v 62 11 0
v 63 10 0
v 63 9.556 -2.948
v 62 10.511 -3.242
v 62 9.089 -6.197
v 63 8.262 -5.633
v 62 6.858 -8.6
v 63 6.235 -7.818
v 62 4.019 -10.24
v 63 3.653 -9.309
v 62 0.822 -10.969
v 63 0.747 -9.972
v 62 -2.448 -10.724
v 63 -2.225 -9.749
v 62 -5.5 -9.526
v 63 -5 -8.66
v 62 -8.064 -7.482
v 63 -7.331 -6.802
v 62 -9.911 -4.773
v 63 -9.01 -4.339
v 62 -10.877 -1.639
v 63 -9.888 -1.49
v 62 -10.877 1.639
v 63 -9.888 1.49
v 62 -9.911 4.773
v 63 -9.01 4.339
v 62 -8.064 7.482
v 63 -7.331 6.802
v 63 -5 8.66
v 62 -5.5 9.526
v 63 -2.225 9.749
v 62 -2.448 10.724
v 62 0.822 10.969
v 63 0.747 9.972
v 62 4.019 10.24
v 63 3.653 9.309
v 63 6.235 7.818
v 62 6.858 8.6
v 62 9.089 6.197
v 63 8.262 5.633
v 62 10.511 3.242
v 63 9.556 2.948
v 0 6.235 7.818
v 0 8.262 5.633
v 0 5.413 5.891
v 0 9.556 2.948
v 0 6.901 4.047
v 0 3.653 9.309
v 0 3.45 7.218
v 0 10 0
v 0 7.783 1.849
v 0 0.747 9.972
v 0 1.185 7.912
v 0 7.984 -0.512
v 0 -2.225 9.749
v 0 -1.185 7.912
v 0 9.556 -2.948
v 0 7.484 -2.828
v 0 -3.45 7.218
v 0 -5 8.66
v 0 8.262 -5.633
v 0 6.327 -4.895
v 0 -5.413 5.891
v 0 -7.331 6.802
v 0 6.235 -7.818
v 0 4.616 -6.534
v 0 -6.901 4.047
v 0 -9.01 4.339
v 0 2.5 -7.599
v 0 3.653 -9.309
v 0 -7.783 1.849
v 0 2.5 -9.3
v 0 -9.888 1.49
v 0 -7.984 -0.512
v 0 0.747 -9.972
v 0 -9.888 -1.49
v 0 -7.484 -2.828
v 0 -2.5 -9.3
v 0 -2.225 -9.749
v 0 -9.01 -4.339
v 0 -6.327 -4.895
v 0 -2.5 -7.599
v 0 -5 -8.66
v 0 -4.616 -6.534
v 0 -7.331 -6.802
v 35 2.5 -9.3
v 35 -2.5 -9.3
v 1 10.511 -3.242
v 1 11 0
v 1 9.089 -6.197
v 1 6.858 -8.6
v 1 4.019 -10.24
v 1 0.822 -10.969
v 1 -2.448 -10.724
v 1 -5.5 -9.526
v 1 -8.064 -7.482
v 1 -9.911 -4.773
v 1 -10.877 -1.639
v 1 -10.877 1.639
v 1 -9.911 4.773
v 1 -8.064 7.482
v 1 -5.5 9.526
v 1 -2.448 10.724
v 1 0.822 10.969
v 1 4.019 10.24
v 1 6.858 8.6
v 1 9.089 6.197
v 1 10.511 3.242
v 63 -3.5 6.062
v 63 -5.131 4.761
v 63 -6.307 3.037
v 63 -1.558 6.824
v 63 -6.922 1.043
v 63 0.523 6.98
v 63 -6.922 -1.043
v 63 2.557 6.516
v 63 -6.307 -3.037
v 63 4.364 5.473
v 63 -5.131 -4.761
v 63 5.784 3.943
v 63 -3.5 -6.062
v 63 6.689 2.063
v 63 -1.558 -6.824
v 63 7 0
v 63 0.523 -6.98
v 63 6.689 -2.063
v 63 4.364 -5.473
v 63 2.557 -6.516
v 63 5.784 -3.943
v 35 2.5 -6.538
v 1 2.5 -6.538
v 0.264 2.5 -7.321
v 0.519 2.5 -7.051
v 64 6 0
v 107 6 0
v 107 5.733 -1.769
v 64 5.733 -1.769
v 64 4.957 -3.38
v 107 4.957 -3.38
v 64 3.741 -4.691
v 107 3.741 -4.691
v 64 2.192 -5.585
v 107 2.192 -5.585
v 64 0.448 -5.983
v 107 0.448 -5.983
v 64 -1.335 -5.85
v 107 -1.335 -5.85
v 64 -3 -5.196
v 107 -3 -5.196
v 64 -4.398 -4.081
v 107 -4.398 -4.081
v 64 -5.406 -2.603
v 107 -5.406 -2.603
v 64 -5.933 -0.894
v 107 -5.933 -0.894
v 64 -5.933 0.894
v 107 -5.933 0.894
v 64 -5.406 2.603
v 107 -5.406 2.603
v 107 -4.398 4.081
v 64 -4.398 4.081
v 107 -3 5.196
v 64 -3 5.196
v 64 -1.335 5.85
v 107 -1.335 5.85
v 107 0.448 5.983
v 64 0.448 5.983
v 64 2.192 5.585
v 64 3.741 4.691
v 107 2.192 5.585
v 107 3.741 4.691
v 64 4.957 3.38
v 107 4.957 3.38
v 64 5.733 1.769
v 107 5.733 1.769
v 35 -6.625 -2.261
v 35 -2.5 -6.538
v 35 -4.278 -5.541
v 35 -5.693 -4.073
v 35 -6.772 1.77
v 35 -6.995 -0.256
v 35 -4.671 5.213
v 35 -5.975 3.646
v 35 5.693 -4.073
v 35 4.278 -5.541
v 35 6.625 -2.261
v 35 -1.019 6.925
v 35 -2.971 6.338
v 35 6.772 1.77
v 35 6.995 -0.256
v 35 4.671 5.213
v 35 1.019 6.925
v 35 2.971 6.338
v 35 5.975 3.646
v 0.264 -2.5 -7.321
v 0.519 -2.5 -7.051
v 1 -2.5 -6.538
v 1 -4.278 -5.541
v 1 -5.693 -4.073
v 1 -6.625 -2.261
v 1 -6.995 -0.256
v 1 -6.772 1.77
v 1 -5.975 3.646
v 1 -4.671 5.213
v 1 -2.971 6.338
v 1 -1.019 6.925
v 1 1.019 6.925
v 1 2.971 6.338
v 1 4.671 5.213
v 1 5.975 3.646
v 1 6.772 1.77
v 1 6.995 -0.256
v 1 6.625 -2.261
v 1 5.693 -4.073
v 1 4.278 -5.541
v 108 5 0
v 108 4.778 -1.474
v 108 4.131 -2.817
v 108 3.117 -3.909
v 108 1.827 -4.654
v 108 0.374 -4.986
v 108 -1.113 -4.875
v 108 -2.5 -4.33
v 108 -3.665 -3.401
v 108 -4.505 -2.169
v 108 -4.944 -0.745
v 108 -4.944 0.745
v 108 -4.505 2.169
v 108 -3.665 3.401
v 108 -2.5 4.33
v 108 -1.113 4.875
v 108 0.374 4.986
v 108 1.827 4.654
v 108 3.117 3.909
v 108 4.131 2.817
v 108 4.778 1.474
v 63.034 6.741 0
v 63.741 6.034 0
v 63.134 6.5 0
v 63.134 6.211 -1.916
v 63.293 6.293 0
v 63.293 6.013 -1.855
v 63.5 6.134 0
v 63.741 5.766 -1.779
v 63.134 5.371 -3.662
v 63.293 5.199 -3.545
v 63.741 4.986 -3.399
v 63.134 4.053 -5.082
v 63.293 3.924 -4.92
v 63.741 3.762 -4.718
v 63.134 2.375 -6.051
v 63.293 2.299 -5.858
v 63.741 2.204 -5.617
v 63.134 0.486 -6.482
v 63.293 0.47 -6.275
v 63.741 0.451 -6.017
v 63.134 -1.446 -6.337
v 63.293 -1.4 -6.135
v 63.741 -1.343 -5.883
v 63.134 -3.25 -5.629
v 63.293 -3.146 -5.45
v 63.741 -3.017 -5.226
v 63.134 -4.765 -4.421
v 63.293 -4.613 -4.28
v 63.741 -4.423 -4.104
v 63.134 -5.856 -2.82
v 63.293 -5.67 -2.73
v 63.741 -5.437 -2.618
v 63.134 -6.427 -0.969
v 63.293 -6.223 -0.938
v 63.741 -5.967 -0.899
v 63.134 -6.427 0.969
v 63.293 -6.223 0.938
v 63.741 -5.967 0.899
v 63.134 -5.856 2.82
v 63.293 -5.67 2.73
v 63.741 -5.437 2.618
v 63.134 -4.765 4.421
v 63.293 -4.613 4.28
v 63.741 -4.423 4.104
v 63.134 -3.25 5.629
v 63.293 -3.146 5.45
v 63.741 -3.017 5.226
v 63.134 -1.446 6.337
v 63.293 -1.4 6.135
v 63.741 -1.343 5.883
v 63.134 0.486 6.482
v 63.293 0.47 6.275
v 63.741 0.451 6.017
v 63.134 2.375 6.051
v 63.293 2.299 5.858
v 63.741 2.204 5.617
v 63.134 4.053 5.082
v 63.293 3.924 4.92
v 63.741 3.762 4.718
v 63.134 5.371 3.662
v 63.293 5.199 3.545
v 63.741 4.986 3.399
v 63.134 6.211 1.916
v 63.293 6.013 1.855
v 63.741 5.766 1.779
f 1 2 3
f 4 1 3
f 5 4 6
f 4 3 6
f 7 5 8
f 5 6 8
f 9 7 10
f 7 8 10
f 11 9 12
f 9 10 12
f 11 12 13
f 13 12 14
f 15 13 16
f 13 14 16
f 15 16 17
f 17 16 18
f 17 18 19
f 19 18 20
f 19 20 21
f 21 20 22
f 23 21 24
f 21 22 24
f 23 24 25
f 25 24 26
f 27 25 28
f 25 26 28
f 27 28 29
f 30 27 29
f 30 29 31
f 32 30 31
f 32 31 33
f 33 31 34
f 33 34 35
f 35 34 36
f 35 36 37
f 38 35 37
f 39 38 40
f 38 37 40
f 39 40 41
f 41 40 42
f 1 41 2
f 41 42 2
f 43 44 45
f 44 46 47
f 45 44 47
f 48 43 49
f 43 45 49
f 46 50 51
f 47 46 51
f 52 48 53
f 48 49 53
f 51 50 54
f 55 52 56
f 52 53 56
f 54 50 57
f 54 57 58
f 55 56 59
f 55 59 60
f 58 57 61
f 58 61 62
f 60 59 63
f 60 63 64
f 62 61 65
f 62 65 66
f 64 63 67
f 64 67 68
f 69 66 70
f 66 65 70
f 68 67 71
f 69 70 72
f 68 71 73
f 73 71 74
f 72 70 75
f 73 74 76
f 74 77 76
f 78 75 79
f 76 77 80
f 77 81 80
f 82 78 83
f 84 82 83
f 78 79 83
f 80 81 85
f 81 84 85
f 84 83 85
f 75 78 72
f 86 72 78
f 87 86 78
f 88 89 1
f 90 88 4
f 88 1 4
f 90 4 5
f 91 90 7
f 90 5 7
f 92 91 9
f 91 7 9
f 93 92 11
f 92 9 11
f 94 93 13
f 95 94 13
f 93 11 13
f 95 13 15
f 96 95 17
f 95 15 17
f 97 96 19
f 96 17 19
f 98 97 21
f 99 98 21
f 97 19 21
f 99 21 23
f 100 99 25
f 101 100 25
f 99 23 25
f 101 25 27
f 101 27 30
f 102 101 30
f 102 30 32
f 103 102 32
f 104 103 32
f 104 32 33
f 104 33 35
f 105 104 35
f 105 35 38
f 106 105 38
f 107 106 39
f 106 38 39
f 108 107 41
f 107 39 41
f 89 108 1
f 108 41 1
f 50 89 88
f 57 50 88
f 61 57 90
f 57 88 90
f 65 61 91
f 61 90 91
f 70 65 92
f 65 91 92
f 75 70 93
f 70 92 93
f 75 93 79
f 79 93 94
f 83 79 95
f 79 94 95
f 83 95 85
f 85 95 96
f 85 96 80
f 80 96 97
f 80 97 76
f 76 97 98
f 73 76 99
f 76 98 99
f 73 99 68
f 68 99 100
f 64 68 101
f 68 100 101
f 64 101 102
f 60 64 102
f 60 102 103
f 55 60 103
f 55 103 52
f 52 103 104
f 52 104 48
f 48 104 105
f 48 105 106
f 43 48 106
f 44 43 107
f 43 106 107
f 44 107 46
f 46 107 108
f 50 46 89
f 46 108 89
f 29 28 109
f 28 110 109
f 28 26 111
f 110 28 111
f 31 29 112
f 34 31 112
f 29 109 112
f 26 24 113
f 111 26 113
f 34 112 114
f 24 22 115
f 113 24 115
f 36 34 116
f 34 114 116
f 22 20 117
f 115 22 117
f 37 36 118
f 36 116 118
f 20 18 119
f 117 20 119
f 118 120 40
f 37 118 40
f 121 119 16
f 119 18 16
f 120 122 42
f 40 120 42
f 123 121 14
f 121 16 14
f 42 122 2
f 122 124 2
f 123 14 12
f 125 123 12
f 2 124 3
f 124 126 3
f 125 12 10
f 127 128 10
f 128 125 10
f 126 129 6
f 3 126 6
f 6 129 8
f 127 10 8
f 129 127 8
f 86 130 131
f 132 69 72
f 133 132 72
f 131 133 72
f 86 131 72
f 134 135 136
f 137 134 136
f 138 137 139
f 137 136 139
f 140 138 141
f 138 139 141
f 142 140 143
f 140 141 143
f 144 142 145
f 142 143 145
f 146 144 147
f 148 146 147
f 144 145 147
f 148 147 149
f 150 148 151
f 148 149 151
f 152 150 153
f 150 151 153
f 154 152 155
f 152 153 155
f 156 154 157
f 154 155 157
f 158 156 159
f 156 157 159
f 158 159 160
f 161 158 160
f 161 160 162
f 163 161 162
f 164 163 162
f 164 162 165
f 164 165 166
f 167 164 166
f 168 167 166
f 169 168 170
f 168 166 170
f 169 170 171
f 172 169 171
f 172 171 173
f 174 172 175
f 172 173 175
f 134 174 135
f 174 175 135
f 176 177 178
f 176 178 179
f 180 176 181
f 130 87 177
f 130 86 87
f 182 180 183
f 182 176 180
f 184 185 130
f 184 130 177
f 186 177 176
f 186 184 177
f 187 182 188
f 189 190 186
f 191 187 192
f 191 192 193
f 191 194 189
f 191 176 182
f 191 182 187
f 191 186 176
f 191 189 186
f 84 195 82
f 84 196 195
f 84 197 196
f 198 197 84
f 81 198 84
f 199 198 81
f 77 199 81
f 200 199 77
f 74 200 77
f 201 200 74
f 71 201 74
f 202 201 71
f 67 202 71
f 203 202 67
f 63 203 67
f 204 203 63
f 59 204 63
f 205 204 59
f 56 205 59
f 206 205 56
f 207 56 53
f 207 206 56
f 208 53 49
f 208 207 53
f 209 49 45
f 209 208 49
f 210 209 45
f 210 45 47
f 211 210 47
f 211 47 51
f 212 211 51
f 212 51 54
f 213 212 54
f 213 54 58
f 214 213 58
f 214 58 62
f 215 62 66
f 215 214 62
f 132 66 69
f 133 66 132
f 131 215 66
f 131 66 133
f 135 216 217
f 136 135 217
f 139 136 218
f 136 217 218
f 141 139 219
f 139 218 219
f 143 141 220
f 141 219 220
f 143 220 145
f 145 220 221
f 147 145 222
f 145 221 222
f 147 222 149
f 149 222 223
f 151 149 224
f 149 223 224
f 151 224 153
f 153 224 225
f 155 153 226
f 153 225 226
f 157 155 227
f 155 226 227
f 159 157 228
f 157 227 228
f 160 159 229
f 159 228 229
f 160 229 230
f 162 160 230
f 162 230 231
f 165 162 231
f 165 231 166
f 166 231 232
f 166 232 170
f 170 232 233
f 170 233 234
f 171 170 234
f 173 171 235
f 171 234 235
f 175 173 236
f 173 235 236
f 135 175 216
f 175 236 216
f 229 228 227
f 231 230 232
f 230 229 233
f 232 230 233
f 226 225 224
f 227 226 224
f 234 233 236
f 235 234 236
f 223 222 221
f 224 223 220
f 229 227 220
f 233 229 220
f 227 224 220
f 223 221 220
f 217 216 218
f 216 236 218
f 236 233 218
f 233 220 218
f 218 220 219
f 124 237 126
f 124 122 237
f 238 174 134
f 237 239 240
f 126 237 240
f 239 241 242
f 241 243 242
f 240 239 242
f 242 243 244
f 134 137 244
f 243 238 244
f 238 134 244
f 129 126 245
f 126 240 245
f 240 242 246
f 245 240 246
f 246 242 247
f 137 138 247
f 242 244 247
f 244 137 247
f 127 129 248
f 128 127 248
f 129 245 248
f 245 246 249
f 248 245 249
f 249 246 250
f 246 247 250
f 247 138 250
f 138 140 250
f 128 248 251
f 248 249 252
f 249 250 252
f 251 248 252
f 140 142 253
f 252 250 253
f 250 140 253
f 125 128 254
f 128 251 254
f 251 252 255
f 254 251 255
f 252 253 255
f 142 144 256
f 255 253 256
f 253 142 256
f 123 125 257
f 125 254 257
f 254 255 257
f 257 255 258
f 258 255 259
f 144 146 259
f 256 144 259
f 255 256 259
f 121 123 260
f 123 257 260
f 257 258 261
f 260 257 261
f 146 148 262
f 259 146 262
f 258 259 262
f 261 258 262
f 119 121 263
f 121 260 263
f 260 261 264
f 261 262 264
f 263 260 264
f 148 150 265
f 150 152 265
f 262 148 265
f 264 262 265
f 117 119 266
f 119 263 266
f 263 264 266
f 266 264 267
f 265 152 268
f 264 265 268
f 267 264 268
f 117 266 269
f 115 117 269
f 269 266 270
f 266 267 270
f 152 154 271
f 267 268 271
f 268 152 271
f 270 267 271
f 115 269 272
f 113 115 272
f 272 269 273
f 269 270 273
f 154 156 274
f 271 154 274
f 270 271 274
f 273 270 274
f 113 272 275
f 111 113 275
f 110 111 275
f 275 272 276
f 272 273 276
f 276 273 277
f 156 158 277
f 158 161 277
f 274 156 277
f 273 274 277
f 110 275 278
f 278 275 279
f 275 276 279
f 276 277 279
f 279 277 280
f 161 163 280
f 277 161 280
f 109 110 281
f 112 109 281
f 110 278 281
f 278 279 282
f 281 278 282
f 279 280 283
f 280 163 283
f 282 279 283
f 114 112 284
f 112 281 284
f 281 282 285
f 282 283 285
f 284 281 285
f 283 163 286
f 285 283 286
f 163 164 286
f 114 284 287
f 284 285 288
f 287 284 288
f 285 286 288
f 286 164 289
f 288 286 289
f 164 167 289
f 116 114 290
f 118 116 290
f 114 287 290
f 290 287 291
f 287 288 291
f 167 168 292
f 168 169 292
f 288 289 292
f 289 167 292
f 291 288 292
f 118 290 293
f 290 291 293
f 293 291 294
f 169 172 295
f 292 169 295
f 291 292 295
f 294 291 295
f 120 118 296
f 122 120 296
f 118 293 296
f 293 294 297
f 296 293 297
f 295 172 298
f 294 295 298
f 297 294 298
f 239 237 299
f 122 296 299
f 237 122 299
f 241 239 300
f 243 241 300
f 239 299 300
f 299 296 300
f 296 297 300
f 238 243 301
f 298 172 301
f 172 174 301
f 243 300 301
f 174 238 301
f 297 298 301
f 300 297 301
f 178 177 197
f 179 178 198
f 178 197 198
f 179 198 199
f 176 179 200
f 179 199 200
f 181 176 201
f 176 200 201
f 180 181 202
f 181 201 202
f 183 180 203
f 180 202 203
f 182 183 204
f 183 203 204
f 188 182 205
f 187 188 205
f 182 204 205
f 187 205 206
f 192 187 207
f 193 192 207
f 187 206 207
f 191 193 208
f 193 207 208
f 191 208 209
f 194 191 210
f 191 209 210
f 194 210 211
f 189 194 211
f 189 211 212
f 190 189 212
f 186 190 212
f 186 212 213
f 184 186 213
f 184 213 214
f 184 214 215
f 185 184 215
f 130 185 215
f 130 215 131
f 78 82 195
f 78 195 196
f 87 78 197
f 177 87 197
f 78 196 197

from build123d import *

# Parameters (mm, degrees)
CUT_EXTRUDE1_DEPTH = 35
CHAMFER2_SIZE      = 1


with BuildPart() as part:
    # Sketch1 → Revolve1 (revolve)
    with BuildSketch(Plane.XY):
        with BuildLine():
            Line((0, 0), (0, 11))
            Line((0, 11), (63, 11))
            Line((63, 11), (63, 7))
            ThreePointArc((63, 7), (63.292893219, 6.292893219), (64, 6))
            Line((64, 6), (108, 6))
            Line((108, 6), (108, 0))
            Line((108, 0), (0, 0))
        make_face()
    revolve(axis=Axis((113.833823868, 0, 0), (-1, 0, 0)))

    # Sketch2 → Cut-Extrude1 (cut)
    with BuildSketch(Plane.ZY):
        with BuildLine():
            Line((-9.3, -2.5), (-6.538348415, -2.5))
            ThreePointArc((-6.538348415, -2.5), (7, 0), (-6.538348415, 2.5))
            Line((-6.538348415, 2.5), (-9.3, 2.5))
            Line((-9.3, 2.5), (-9.3, -2.5))
        make_face()
    extrude(amount=-CUT_EXTRUDE1_DEPTH, mode=Mode.SUBTRACT)

    # Chamfer2
    chamfer2_edges = [part.edges().sort_by_distance(p)[0] for p in [
        (0, 0, 7),
        (0, -11, 0),
        (63, -11, 0),
        (108, -6, 0),
    ]]
    chamfer(chamfer2_edges, length=CHAMFER2_SIZE)


solid = part.part
